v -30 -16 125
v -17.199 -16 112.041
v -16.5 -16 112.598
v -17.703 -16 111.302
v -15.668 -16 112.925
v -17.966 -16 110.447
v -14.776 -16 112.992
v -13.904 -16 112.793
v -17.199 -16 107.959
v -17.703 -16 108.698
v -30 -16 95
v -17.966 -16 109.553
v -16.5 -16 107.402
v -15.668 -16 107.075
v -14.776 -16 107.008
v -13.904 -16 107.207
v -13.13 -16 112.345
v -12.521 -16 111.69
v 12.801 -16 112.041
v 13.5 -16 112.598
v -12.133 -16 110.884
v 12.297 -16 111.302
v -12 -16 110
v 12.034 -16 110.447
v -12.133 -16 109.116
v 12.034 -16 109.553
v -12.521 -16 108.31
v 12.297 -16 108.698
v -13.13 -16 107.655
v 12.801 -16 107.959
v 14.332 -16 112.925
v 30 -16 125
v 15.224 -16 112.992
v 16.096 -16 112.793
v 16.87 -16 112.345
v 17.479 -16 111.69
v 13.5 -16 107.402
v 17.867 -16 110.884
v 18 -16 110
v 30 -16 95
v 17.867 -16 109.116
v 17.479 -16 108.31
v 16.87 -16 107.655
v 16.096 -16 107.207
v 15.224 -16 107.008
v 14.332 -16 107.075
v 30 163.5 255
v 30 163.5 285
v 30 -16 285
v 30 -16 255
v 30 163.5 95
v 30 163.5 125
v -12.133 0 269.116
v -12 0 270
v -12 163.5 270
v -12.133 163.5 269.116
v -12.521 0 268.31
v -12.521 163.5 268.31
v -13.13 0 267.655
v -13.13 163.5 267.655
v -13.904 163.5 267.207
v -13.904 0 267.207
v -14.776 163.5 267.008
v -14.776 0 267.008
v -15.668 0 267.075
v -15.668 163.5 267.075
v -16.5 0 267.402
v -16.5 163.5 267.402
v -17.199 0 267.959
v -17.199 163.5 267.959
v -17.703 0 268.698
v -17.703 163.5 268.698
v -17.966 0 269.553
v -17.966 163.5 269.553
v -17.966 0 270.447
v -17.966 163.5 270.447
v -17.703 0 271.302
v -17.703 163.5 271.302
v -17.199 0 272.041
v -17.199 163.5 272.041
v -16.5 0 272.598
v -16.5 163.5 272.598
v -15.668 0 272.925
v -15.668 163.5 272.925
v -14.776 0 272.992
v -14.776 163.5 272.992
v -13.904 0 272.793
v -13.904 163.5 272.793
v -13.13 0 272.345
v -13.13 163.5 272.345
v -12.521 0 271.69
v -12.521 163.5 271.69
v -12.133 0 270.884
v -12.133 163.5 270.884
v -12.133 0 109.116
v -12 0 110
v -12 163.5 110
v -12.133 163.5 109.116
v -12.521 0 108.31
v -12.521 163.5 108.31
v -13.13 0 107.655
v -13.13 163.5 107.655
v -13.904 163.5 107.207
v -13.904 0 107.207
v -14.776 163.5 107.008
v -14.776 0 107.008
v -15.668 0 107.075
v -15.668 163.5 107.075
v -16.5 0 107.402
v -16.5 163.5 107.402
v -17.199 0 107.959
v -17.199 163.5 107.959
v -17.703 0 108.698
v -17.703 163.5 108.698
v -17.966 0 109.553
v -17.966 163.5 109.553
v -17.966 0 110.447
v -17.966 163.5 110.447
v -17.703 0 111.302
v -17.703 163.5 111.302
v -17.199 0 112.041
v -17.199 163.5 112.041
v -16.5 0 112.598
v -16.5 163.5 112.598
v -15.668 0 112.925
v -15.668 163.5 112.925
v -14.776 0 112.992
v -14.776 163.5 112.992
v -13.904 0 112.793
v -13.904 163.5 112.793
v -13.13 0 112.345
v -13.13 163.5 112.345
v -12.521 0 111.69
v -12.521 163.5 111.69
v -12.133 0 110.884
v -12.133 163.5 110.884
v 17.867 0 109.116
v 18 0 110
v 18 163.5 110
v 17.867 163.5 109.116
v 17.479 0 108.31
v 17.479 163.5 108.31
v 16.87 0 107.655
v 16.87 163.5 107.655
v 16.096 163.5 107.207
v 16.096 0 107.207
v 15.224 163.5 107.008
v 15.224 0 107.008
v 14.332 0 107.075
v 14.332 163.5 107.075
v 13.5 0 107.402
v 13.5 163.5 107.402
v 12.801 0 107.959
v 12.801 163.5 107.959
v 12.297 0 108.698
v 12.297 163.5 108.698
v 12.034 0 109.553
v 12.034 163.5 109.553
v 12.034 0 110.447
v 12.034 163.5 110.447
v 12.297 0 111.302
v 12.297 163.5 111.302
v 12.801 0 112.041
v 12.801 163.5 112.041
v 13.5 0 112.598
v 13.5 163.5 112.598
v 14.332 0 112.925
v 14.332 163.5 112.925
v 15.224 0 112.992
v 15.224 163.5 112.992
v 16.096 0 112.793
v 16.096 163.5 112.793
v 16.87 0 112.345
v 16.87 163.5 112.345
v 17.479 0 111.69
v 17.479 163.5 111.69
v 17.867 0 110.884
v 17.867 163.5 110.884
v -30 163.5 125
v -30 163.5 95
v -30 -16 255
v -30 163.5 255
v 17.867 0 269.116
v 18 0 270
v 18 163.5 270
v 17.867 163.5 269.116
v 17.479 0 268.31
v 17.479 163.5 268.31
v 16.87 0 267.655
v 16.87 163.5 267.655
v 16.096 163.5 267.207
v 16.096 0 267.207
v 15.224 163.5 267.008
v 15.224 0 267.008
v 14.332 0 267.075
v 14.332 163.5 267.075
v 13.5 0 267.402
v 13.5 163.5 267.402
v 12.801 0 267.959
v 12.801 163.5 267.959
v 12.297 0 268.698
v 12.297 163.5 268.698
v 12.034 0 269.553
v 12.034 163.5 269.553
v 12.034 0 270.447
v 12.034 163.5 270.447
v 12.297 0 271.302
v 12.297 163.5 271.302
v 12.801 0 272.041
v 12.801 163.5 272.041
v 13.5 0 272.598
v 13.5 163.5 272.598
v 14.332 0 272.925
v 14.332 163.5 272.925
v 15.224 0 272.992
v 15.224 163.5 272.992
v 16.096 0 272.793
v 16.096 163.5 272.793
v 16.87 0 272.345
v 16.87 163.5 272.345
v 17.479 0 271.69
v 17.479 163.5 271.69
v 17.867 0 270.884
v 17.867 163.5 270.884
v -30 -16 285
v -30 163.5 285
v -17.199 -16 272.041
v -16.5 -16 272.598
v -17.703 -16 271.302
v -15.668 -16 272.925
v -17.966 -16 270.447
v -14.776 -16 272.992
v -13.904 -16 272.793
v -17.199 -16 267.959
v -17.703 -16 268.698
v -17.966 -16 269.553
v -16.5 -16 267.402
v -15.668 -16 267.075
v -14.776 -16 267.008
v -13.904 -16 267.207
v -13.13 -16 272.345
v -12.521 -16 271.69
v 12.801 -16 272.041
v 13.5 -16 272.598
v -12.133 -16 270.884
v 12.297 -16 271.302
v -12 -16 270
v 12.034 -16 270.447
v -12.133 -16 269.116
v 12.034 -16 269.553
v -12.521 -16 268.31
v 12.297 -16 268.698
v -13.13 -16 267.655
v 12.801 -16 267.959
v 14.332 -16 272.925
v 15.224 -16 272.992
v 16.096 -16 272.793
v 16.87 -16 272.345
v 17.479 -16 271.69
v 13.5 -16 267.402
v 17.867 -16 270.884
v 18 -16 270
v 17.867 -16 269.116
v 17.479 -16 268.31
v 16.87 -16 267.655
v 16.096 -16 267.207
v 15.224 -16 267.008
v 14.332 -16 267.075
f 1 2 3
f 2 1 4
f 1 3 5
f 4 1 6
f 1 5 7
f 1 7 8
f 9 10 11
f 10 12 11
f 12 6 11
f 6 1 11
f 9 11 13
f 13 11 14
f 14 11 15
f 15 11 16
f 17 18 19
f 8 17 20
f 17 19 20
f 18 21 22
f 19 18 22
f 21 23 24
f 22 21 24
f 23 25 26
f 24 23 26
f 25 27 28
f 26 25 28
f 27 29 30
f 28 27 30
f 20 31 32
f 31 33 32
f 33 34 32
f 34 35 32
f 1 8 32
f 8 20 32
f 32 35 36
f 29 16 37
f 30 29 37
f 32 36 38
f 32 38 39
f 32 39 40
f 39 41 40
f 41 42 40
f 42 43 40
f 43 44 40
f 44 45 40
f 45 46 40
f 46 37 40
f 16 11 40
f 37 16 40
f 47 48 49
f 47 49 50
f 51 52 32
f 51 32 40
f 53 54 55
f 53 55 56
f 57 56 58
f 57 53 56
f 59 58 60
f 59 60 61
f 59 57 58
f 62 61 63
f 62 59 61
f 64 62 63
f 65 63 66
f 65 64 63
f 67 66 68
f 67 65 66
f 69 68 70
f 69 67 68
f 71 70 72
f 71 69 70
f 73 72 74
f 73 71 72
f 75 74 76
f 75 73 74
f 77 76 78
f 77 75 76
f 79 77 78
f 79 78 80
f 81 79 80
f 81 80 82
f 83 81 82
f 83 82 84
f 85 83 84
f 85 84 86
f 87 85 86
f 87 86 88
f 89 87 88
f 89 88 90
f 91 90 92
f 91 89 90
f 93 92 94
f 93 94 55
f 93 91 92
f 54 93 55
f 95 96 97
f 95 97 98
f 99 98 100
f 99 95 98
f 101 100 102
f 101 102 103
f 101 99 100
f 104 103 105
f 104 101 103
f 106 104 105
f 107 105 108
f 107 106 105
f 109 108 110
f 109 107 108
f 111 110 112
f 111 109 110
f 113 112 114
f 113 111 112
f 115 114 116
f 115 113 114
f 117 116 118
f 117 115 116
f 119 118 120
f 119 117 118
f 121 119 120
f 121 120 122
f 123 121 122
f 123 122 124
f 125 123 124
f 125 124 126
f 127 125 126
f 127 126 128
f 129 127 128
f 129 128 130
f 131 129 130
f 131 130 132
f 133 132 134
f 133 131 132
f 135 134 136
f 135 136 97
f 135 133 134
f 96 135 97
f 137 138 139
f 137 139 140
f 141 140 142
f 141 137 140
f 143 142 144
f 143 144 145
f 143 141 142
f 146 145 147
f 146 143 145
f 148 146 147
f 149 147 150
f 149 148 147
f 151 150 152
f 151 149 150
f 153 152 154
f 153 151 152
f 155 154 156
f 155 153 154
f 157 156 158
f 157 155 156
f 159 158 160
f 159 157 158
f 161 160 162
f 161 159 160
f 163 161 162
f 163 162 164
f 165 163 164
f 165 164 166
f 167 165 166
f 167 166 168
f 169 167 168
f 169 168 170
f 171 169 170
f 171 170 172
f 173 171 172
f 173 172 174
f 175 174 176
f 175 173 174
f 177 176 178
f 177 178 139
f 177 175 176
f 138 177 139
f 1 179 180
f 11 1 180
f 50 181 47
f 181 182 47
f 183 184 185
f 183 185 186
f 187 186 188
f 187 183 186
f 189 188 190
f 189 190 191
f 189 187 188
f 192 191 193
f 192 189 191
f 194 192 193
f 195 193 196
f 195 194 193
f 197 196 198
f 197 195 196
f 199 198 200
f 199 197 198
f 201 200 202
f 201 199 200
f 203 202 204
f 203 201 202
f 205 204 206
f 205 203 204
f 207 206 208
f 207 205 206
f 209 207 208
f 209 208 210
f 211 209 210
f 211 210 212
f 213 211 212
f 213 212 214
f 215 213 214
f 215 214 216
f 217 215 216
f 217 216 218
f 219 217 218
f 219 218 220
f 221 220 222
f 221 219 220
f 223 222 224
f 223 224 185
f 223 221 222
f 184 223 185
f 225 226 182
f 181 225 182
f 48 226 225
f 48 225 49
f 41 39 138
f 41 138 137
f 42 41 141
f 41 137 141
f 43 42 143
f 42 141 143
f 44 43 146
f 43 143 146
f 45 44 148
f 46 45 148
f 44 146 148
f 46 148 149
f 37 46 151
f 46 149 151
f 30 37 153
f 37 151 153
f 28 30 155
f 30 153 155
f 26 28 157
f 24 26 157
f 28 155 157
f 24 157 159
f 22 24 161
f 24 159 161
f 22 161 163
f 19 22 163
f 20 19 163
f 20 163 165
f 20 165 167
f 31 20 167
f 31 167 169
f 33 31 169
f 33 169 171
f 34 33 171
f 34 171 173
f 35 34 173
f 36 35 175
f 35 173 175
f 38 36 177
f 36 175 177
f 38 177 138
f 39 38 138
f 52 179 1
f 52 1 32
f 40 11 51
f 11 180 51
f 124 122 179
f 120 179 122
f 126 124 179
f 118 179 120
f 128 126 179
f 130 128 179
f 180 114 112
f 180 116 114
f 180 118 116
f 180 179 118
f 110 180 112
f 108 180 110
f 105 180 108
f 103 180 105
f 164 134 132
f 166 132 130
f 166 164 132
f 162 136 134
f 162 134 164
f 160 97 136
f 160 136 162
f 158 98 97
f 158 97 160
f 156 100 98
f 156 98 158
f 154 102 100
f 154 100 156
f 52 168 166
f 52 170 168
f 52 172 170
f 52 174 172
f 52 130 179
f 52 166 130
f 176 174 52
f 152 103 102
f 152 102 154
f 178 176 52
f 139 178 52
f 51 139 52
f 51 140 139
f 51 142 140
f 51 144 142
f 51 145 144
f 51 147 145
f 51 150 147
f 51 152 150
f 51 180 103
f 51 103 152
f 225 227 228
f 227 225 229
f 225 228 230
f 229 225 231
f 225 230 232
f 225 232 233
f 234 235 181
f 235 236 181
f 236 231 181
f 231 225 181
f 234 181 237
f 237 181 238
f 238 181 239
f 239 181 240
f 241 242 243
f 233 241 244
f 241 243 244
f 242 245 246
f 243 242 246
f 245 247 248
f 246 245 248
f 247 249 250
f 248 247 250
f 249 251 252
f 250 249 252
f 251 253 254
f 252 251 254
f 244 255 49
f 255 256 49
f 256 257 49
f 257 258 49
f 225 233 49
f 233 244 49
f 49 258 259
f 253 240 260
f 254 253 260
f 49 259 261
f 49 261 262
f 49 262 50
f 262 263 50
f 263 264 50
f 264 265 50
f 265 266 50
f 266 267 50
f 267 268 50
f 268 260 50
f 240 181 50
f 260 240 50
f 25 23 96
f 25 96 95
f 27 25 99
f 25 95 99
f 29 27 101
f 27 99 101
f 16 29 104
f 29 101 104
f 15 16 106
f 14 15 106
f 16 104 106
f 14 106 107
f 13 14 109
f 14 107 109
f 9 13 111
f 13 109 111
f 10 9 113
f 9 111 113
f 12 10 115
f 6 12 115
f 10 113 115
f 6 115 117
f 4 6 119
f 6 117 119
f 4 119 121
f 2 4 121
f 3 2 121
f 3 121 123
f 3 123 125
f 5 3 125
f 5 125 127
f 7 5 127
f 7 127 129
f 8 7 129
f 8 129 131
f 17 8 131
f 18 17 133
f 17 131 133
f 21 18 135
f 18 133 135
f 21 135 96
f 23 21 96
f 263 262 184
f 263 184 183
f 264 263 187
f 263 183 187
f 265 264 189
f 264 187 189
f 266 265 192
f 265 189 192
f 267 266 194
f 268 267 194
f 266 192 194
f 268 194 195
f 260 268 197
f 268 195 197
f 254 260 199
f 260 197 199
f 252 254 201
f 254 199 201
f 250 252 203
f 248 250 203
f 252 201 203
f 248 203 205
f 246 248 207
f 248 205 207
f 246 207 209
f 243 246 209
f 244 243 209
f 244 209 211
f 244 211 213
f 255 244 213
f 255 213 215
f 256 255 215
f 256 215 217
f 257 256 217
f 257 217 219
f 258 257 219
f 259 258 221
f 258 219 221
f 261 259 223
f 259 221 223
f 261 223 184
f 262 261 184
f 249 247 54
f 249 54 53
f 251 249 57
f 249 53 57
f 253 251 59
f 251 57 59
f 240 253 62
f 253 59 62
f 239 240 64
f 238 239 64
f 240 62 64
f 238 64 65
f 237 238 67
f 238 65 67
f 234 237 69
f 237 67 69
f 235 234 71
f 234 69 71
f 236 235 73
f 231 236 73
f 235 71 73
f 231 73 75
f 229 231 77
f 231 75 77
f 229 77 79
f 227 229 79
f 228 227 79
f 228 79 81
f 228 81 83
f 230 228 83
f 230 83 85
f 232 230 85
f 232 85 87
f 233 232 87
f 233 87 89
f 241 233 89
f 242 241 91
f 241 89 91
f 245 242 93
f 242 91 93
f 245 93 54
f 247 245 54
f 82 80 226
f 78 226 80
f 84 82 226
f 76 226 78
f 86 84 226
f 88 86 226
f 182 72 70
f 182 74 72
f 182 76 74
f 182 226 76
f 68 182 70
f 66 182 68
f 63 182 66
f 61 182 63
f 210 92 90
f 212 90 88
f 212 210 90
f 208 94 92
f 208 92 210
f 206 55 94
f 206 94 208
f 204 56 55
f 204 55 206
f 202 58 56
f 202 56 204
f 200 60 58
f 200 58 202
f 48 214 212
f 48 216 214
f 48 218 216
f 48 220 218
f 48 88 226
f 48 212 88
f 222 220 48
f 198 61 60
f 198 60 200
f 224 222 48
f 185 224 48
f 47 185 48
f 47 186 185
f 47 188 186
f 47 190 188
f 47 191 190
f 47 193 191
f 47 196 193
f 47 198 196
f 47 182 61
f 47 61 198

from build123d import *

# Parameters (mm, degrees)
SKIZZE4_W                              = 60
SKIZZE4_H                              = 30
SKIZZE4_R                              = 3
AUFSATZ_LINEAR_AUSTRAGEN1_DEPTH        = 163.5
AUFSATZ_LINEAR_AUSTRAGEN1_DEPTH_BACK   = 16
AUFSATZ_LINEAR_AUSTRAGEN1_2_DEPTH      = 163.5
AUFSATZ_LINEAR_AUSTRAGEN1_2_DEPTH_BACK = 16


with BuildPart() as part:
    # Skizze4 → Aufsatz-Linear austragen1 (new body, two sides)
    with BuildSketch(Plane(origin=(0, 0, 0), x_dir=(1, 0, 0), z_dir=(0, 1, 0))) as aufsatz_linear_austragen1_sk:
        with Locations((0, -110)):
            Rectangle(SKIZZE4_W, SKIZZE4_H)
        with Locations((-15, -110)):
            Circle(SKIZZE4_R, mode=Mode.SUBTRACT)
        with Locations((15, -110)):
            Circle(SKIZZE4_R, mode=Mode.SUBTRACT)
    extrude(amount=AUFSATZ_LINEAR_AUSTRAGEN1_DEPTH)
    extrude(aufsatz_linear_austragen1_sk.sketch, amount=-AUFSATZ_LINEAR_AUSTRAGEN1_DEPTH_BACK)


with BuildPart() as body_2:
    # Skizze4 → Aufsatz-Linear austragen1 2 (new body, two sides)
    with BuildSketch(Plane(origin=(0, 0, 0), x_dir=(1, 0, 0), z_dir=(0, 1, 0))) as aufsatz_linear_austragen1_2_sk:
        with Locations((0, -270)):
            Rectangle(SKIZZE4_W, SKIZZE4_H)
        with Locations((15, -270)):
            Circle(SKIZZE4_R, mode=Mode.SUBTRACT)
        with Locations((-15, -270)):
            Circle(SKIZZE4_R, mode=Mode.SUBTRACT)
    extrude(amount=AUFSATZ_LINEAR_AUSTRAGEN1_2_DEPTH)
    extrude(aufsatz_linear_austragen1_2_sk.sketch, amount=-AUFSATZ_LINEAR_AUSTRAGEN1_2_DEPTH_BACK)


solid = Compound([part.part, body_2.part])
